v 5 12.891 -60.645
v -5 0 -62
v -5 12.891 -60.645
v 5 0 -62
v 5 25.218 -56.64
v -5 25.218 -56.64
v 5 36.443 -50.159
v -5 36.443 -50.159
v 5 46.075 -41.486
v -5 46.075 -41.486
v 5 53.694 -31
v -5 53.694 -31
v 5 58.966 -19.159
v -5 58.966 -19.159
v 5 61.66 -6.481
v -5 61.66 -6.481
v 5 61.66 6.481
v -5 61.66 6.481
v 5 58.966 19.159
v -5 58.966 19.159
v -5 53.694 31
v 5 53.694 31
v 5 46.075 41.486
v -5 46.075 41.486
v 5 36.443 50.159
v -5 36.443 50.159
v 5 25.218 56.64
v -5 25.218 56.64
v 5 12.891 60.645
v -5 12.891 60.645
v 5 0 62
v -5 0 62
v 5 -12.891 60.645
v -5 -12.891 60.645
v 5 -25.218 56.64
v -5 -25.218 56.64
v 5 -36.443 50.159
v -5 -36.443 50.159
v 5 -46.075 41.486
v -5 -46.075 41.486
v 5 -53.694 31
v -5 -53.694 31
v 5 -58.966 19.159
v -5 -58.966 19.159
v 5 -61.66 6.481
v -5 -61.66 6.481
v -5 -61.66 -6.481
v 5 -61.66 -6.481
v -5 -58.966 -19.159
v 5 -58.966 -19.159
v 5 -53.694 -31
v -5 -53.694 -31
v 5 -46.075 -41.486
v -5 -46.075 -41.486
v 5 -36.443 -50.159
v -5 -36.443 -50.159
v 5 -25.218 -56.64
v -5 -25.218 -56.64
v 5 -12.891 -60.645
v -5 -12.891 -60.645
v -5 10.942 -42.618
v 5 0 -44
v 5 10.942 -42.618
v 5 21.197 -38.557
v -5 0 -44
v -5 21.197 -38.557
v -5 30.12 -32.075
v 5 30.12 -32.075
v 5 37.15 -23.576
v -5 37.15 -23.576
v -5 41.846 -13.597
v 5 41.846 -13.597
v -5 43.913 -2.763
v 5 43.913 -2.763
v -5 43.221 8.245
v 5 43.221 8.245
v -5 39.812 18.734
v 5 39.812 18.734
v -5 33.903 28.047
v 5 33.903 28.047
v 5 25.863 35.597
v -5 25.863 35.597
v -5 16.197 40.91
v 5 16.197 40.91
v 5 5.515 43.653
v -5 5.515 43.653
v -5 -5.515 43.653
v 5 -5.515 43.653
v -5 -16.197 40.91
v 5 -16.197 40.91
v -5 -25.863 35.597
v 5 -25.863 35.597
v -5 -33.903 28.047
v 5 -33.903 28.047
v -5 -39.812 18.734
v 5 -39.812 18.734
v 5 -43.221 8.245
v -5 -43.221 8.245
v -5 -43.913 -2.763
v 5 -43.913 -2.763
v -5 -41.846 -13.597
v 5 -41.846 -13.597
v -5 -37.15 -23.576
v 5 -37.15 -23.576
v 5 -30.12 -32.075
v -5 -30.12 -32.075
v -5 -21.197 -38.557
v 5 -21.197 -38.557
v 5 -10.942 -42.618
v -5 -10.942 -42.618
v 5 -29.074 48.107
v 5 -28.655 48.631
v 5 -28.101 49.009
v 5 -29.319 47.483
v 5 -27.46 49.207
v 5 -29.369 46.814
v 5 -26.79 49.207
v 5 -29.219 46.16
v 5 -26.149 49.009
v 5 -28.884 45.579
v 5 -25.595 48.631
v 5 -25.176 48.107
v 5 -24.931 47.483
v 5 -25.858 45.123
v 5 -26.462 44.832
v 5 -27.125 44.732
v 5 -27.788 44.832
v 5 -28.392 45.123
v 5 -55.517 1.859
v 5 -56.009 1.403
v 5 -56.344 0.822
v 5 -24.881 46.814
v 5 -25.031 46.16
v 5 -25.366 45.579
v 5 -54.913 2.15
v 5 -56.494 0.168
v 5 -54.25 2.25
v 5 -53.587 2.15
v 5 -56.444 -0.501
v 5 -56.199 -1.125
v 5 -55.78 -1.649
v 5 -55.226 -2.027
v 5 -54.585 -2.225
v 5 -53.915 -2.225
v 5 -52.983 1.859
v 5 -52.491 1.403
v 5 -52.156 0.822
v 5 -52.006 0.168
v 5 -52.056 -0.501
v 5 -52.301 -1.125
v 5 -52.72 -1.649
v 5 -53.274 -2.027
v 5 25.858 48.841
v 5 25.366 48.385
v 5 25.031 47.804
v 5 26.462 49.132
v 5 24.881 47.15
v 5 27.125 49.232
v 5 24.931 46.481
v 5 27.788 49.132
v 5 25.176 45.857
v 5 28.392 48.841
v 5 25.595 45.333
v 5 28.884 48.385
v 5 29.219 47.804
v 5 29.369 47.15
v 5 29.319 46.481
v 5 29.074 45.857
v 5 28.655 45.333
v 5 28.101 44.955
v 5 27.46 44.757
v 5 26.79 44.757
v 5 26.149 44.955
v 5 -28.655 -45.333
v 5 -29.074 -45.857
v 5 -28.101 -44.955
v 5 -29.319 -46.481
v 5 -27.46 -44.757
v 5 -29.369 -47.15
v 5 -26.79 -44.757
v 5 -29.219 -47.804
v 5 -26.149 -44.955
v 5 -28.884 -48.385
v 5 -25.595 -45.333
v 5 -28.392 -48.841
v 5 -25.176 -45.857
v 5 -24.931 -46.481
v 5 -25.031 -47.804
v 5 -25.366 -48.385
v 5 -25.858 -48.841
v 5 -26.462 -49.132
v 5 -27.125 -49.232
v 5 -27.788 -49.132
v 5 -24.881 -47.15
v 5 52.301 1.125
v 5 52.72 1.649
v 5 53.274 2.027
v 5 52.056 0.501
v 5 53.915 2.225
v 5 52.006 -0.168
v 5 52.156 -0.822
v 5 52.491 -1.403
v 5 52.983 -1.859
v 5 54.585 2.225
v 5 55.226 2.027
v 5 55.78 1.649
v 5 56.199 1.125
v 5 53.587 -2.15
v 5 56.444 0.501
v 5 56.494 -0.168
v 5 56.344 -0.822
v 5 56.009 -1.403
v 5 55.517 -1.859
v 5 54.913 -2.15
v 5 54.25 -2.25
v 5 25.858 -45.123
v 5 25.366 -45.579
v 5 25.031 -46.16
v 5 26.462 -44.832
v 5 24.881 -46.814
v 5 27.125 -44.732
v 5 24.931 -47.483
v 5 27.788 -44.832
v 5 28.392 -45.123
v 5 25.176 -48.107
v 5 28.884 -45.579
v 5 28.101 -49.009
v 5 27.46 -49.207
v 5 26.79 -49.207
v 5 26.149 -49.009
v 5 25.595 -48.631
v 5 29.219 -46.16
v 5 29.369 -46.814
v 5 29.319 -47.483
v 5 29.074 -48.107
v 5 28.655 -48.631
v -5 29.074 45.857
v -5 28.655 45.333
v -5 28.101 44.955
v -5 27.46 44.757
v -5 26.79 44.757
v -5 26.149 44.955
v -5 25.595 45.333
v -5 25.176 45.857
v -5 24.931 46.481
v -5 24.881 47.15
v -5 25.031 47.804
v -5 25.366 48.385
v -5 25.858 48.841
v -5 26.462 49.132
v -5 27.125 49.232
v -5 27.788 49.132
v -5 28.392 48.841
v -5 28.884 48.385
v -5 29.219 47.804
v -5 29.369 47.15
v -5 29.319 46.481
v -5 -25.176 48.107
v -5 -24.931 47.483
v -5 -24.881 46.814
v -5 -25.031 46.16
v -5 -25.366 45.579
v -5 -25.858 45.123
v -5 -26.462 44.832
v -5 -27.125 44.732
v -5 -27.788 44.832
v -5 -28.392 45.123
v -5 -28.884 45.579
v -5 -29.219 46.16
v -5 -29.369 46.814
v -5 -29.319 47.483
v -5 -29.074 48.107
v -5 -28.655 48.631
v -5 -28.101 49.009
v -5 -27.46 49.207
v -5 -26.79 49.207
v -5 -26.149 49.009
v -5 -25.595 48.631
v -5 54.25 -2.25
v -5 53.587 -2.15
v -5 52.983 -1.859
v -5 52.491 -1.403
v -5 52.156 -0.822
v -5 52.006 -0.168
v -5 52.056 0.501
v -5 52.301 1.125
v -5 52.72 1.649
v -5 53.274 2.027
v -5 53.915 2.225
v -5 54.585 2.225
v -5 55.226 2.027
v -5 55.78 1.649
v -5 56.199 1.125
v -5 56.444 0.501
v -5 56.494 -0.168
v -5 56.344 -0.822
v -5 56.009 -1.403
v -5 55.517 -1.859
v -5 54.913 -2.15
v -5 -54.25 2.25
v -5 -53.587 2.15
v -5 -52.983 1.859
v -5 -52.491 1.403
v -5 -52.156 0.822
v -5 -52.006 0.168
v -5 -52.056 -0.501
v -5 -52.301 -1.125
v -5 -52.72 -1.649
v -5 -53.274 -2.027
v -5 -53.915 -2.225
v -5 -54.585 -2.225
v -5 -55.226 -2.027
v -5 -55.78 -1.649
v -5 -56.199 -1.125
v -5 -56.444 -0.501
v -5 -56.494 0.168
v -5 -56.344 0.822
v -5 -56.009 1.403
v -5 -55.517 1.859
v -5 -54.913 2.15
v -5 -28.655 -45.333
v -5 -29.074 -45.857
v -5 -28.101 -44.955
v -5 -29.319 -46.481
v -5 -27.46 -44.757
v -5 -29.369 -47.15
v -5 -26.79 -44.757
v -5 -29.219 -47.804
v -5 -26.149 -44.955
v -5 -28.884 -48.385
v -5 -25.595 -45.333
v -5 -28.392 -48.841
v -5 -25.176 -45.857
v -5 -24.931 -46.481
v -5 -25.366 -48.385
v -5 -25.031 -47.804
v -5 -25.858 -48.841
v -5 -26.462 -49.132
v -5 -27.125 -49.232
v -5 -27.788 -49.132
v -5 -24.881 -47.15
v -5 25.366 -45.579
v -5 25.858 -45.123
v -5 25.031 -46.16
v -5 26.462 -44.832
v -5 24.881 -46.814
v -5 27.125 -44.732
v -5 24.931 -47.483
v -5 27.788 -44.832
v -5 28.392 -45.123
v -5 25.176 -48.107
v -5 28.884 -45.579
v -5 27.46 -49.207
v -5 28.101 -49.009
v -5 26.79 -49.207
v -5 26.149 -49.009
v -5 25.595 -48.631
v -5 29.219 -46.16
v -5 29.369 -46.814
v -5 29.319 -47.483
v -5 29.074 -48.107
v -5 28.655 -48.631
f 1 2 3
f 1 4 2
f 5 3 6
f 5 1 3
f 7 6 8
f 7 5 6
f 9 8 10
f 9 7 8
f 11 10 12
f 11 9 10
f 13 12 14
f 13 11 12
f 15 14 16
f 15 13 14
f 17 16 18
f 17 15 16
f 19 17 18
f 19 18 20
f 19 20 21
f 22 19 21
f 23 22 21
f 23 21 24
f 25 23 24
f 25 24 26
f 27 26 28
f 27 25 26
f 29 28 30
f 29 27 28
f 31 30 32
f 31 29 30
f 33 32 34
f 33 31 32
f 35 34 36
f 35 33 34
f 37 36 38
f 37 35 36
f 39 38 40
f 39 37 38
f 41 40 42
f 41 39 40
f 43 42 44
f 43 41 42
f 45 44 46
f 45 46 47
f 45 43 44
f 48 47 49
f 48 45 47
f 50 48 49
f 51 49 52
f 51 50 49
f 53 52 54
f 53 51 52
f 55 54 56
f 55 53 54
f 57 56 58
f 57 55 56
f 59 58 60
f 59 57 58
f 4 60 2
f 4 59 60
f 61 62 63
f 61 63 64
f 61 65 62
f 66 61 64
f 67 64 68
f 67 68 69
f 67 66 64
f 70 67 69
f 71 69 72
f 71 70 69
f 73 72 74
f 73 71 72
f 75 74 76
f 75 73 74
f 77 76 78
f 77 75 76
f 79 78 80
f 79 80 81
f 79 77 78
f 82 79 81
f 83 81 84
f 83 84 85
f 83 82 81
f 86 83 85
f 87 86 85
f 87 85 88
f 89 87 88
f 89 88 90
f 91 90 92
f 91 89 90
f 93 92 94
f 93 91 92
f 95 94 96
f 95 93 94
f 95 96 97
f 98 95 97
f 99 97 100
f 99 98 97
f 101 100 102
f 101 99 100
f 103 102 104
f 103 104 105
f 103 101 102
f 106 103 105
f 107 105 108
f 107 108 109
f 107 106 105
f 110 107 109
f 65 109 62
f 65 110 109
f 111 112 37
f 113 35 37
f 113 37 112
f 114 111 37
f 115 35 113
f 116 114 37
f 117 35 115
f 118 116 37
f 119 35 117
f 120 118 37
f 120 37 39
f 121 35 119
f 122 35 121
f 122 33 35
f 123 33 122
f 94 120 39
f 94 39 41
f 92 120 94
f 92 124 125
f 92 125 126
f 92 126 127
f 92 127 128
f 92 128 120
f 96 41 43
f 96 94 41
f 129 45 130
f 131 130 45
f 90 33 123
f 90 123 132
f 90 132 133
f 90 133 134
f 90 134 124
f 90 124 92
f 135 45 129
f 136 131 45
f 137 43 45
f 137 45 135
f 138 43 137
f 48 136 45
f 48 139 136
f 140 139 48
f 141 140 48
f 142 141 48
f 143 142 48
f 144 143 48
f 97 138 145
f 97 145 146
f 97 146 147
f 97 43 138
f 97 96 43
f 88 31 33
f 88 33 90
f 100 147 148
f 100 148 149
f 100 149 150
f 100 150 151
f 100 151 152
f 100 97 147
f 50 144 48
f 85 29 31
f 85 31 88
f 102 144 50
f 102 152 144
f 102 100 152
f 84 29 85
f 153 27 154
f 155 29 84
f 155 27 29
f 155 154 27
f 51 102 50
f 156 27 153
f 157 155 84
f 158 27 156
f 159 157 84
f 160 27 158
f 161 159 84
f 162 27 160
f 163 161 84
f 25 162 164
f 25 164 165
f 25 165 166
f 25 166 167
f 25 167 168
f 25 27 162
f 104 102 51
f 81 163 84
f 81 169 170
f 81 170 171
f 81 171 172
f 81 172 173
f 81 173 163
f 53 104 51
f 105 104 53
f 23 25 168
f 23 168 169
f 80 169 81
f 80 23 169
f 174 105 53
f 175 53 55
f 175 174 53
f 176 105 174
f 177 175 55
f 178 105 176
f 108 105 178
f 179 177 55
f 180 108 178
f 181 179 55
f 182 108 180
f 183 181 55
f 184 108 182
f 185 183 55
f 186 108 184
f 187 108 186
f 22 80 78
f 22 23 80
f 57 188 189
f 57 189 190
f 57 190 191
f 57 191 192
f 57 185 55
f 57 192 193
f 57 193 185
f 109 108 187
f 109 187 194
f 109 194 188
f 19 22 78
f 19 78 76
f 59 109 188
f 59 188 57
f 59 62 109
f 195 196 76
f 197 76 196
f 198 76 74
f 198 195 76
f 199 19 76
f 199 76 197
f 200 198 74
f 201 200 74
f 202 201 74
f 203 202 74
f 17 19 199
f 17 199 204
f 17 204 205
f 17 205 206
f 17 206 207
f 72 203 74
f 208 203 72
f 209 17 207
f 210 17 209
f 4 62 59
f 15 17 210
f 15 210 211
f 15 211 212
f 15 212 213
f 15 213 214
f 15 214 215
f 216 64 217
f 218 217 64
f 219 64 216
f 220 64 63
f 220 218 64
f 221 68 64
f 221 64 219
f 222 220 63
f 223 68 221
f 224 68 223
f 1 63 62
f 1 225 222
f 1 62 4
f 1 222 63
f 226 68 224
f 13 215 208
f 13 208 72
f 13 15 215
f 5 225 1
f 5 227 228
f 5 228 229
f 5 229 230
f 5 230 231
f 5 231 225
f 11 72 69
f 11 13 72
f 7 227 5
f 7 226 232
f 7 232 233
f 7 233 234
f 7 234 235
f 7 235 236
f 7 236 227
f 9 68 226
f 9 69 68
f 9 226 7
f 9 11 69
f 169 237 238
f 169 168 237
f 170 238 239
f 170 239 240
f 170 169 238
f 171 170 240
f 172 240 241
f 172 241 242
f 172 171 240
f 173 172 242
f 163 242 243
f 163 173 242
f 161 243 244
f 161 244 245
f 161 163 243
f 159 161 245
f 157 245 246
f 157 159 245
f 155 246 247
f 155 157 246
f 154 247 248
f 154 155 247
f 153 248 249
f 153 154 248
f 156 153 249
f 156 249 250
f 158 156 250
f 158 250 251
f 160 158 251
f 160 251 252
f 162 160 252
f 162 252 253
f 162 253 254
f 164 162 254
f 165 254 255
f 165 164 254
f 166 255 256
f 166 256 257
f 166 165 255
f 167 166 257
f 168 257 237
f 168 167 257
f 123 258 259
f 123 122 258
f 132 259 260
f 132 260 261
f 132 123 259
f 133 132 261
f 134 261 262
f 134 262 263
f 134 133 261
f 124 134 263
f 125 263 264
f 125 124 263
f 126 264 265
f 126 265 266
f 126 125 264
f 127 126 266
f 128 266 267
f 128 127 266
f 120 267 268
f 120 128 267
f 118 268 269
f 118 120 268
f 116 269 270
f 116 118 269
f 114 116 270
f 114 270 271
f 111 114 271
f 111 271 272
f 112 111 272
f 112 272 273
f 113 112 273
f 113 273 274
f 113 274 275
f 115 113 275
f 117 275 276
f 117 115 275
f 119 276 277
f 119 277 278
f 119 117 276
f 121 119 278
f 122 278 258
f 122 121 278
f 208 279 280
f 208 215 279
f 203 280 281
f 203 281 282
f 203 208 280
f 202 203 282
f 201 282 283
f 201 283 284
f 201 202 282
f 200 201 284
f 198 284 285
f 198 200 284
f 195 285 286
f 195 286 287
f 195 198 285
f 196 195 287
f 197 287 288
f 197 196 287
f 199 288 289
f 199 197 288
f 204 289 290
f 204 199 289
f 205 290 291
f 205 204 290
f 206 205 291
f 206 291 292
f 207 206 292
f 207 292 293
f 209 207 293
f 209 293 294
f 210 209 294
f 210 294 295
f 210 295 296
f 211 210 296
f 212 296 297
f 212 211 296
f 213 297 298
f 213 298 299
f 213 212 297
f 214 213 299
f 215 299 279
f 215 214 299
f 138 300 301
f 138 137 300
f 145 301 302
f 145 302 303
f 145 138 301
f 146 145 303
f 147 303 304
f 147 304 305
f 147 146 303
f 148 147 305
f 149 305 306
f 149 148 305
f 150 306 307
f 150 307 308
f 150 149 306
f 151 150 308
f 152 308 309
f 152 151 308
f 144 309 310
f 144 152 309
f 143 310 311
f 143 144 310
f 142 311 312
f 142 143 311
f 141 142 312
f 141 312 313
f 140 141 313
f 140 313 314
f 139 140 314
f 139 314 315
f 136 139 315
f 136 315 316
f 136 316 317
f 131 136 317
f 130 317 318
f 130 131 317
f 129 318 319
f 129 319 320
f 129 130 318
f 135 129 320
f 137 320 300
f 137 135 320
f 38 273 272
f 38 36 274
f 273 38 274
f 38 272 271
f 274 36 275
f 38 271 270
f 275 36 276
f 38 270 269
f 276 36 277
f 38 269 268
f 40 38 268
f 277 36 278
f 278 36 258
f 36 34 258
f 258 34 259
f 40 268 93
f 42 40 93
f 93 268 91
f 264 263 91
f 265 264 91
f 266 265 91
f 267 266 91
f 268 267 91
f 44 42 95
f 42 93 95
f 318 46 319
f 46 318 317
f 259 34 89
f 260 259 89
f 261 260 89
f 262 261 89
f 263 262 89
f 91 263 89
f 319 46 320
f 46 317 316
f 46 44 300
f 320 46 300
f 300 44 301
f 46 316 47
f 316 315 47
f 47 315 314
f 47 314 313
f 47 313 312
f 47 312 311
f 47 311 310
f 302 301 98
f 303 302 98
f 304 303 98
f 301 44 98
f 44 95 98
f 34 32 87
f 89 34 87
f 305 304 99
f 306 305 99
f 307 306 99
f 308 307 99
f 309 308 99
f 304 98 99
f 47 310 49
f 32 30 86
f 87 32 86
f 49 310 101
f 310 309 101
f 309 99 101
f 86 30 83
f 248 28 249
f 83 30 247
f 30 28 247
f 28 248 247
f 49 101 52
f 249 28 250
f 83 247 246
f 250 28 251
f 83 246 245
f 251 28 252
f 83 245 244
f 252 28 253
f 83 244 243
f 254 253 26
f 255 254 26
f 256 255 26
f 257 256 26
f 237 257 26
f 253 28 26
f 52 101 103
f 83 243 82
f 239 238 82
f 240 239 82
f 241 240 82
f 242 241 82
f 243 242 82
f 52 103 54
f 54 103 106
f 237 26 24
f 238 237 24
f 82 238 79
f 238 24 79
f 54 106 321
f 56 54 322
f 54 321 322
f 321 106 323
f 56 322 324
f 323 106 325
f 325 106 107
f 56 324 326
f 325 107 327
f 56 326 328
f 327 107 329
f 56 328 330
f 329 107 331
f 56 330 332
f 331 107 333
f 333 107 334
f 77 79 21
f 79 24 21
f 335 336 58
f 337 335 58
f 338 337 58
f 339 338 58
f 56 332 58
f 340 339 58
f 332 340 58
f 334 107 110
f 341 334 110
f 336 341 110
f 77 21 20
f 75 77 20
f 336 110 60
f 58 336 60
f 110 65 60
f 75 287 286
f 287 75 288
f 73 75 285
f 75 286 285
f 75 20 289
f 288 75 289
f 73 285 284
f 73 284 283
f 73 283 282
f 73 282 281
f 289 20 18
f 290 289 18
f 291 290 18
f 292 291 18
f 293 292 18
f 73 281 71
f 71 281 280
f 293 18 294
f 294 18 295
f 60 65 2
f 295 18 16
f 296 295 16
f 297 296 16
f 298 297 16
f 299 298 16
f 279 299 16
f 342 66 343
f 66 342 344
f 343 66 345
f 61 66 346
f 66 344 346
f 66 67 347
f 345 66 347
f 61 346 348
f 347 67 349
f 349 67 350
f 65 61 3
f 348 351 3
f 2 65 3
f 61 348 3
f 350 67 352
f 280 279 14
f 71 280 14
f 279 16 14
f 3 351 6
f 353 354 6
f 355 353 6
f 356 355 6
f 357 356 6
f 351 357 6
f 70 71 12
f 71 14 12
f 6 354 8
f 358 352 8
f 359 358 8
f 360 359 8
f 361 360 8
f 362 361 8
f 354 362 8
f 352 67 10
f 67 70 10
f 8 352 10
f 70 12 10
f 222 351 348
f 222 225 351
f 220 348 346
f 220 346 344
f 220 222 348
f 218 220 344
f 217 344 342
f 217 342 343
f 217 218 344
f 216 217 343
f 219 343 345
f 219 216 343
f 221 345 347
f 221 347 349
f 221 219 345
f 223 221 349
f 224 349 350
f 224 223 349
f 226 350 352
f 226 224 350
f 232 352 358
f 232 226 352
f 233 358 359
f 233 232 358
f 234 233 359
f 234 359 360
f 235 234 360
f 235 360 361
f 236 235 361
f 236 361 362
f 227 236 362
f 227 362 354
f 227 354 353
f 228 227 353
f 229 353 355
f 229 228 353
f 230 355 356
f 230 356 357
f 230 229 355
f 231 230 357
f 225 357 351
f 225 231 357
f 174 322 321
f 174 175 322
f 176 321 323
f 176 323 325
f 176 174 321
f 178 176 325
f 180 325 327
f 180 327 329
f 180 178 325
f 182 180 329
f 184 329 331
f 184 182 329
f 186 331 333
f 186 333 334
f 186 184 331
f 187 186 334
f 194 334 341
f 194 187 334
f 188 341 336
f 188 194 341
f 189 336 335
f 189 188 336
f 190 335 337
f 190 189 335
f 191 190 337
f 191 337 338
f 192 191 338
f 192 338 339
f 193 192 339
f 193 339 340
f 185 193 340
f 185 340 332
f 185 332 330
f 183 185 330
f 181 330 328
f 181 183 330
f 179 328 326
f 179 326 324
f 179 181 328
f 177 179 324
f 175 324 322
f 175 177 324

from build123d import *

# Parameters (mm, degrees)
SKETCH_1_R                = 62
SKETCH_1_R_2              = 44
EXTRUDE_373_DEPTH         = 5
PATTERN_CIRCULAR_M4_COUNT = 6


with BuildPart() as part:
    # ｽｹｯﾁ1 → Extrude 373 (new, symmetric)
    with BuildSketch(Plane(origin=(0, 0, 0), x_dir=(0, 0, -1), z_dir=(1, 0, 0))):
        Circle(SKETCH_1_R)
        Circle(SKETCH_1_R_2, mode=Mode.SUBTRACT)
    extrude(amount=EXTRUDE_373_DEPTH, both=True)

    # ｽｹｯﾁ2 → M4 通し穴 (revolve, cut)
    with BuildSketch(Plane(origin=(5, 54.25, 0), x_dir=(0, 0, -1), z_dir=(0, 1, 0))):
        Polygon((0, 0), (0, 11.351936393), (2.25, 10), (2.25, 0), align=None)
    hole_wizard_m4 = revolve(axis=Axis((11.35, 54.25, 0), (-1, 0, 0)), mode=Mode.SUBTRACT)

    # M4 通し穴 等配: M4 通し穴 ×6 about axis
    pattern_circular_m4_axis = Axis((-5.5, 0, 0), (1, 0, 0))
    for i in range(1, PATTERN_CIRCULAR_M4_COUNT):
        add(hole_wizard_m4.rotate(pattern_circular_m4_axis, i * 360 / PATTERN_CIRCULAR_M4_COUNT), mode=Mode.SUBTRACT)


solid = part.part
